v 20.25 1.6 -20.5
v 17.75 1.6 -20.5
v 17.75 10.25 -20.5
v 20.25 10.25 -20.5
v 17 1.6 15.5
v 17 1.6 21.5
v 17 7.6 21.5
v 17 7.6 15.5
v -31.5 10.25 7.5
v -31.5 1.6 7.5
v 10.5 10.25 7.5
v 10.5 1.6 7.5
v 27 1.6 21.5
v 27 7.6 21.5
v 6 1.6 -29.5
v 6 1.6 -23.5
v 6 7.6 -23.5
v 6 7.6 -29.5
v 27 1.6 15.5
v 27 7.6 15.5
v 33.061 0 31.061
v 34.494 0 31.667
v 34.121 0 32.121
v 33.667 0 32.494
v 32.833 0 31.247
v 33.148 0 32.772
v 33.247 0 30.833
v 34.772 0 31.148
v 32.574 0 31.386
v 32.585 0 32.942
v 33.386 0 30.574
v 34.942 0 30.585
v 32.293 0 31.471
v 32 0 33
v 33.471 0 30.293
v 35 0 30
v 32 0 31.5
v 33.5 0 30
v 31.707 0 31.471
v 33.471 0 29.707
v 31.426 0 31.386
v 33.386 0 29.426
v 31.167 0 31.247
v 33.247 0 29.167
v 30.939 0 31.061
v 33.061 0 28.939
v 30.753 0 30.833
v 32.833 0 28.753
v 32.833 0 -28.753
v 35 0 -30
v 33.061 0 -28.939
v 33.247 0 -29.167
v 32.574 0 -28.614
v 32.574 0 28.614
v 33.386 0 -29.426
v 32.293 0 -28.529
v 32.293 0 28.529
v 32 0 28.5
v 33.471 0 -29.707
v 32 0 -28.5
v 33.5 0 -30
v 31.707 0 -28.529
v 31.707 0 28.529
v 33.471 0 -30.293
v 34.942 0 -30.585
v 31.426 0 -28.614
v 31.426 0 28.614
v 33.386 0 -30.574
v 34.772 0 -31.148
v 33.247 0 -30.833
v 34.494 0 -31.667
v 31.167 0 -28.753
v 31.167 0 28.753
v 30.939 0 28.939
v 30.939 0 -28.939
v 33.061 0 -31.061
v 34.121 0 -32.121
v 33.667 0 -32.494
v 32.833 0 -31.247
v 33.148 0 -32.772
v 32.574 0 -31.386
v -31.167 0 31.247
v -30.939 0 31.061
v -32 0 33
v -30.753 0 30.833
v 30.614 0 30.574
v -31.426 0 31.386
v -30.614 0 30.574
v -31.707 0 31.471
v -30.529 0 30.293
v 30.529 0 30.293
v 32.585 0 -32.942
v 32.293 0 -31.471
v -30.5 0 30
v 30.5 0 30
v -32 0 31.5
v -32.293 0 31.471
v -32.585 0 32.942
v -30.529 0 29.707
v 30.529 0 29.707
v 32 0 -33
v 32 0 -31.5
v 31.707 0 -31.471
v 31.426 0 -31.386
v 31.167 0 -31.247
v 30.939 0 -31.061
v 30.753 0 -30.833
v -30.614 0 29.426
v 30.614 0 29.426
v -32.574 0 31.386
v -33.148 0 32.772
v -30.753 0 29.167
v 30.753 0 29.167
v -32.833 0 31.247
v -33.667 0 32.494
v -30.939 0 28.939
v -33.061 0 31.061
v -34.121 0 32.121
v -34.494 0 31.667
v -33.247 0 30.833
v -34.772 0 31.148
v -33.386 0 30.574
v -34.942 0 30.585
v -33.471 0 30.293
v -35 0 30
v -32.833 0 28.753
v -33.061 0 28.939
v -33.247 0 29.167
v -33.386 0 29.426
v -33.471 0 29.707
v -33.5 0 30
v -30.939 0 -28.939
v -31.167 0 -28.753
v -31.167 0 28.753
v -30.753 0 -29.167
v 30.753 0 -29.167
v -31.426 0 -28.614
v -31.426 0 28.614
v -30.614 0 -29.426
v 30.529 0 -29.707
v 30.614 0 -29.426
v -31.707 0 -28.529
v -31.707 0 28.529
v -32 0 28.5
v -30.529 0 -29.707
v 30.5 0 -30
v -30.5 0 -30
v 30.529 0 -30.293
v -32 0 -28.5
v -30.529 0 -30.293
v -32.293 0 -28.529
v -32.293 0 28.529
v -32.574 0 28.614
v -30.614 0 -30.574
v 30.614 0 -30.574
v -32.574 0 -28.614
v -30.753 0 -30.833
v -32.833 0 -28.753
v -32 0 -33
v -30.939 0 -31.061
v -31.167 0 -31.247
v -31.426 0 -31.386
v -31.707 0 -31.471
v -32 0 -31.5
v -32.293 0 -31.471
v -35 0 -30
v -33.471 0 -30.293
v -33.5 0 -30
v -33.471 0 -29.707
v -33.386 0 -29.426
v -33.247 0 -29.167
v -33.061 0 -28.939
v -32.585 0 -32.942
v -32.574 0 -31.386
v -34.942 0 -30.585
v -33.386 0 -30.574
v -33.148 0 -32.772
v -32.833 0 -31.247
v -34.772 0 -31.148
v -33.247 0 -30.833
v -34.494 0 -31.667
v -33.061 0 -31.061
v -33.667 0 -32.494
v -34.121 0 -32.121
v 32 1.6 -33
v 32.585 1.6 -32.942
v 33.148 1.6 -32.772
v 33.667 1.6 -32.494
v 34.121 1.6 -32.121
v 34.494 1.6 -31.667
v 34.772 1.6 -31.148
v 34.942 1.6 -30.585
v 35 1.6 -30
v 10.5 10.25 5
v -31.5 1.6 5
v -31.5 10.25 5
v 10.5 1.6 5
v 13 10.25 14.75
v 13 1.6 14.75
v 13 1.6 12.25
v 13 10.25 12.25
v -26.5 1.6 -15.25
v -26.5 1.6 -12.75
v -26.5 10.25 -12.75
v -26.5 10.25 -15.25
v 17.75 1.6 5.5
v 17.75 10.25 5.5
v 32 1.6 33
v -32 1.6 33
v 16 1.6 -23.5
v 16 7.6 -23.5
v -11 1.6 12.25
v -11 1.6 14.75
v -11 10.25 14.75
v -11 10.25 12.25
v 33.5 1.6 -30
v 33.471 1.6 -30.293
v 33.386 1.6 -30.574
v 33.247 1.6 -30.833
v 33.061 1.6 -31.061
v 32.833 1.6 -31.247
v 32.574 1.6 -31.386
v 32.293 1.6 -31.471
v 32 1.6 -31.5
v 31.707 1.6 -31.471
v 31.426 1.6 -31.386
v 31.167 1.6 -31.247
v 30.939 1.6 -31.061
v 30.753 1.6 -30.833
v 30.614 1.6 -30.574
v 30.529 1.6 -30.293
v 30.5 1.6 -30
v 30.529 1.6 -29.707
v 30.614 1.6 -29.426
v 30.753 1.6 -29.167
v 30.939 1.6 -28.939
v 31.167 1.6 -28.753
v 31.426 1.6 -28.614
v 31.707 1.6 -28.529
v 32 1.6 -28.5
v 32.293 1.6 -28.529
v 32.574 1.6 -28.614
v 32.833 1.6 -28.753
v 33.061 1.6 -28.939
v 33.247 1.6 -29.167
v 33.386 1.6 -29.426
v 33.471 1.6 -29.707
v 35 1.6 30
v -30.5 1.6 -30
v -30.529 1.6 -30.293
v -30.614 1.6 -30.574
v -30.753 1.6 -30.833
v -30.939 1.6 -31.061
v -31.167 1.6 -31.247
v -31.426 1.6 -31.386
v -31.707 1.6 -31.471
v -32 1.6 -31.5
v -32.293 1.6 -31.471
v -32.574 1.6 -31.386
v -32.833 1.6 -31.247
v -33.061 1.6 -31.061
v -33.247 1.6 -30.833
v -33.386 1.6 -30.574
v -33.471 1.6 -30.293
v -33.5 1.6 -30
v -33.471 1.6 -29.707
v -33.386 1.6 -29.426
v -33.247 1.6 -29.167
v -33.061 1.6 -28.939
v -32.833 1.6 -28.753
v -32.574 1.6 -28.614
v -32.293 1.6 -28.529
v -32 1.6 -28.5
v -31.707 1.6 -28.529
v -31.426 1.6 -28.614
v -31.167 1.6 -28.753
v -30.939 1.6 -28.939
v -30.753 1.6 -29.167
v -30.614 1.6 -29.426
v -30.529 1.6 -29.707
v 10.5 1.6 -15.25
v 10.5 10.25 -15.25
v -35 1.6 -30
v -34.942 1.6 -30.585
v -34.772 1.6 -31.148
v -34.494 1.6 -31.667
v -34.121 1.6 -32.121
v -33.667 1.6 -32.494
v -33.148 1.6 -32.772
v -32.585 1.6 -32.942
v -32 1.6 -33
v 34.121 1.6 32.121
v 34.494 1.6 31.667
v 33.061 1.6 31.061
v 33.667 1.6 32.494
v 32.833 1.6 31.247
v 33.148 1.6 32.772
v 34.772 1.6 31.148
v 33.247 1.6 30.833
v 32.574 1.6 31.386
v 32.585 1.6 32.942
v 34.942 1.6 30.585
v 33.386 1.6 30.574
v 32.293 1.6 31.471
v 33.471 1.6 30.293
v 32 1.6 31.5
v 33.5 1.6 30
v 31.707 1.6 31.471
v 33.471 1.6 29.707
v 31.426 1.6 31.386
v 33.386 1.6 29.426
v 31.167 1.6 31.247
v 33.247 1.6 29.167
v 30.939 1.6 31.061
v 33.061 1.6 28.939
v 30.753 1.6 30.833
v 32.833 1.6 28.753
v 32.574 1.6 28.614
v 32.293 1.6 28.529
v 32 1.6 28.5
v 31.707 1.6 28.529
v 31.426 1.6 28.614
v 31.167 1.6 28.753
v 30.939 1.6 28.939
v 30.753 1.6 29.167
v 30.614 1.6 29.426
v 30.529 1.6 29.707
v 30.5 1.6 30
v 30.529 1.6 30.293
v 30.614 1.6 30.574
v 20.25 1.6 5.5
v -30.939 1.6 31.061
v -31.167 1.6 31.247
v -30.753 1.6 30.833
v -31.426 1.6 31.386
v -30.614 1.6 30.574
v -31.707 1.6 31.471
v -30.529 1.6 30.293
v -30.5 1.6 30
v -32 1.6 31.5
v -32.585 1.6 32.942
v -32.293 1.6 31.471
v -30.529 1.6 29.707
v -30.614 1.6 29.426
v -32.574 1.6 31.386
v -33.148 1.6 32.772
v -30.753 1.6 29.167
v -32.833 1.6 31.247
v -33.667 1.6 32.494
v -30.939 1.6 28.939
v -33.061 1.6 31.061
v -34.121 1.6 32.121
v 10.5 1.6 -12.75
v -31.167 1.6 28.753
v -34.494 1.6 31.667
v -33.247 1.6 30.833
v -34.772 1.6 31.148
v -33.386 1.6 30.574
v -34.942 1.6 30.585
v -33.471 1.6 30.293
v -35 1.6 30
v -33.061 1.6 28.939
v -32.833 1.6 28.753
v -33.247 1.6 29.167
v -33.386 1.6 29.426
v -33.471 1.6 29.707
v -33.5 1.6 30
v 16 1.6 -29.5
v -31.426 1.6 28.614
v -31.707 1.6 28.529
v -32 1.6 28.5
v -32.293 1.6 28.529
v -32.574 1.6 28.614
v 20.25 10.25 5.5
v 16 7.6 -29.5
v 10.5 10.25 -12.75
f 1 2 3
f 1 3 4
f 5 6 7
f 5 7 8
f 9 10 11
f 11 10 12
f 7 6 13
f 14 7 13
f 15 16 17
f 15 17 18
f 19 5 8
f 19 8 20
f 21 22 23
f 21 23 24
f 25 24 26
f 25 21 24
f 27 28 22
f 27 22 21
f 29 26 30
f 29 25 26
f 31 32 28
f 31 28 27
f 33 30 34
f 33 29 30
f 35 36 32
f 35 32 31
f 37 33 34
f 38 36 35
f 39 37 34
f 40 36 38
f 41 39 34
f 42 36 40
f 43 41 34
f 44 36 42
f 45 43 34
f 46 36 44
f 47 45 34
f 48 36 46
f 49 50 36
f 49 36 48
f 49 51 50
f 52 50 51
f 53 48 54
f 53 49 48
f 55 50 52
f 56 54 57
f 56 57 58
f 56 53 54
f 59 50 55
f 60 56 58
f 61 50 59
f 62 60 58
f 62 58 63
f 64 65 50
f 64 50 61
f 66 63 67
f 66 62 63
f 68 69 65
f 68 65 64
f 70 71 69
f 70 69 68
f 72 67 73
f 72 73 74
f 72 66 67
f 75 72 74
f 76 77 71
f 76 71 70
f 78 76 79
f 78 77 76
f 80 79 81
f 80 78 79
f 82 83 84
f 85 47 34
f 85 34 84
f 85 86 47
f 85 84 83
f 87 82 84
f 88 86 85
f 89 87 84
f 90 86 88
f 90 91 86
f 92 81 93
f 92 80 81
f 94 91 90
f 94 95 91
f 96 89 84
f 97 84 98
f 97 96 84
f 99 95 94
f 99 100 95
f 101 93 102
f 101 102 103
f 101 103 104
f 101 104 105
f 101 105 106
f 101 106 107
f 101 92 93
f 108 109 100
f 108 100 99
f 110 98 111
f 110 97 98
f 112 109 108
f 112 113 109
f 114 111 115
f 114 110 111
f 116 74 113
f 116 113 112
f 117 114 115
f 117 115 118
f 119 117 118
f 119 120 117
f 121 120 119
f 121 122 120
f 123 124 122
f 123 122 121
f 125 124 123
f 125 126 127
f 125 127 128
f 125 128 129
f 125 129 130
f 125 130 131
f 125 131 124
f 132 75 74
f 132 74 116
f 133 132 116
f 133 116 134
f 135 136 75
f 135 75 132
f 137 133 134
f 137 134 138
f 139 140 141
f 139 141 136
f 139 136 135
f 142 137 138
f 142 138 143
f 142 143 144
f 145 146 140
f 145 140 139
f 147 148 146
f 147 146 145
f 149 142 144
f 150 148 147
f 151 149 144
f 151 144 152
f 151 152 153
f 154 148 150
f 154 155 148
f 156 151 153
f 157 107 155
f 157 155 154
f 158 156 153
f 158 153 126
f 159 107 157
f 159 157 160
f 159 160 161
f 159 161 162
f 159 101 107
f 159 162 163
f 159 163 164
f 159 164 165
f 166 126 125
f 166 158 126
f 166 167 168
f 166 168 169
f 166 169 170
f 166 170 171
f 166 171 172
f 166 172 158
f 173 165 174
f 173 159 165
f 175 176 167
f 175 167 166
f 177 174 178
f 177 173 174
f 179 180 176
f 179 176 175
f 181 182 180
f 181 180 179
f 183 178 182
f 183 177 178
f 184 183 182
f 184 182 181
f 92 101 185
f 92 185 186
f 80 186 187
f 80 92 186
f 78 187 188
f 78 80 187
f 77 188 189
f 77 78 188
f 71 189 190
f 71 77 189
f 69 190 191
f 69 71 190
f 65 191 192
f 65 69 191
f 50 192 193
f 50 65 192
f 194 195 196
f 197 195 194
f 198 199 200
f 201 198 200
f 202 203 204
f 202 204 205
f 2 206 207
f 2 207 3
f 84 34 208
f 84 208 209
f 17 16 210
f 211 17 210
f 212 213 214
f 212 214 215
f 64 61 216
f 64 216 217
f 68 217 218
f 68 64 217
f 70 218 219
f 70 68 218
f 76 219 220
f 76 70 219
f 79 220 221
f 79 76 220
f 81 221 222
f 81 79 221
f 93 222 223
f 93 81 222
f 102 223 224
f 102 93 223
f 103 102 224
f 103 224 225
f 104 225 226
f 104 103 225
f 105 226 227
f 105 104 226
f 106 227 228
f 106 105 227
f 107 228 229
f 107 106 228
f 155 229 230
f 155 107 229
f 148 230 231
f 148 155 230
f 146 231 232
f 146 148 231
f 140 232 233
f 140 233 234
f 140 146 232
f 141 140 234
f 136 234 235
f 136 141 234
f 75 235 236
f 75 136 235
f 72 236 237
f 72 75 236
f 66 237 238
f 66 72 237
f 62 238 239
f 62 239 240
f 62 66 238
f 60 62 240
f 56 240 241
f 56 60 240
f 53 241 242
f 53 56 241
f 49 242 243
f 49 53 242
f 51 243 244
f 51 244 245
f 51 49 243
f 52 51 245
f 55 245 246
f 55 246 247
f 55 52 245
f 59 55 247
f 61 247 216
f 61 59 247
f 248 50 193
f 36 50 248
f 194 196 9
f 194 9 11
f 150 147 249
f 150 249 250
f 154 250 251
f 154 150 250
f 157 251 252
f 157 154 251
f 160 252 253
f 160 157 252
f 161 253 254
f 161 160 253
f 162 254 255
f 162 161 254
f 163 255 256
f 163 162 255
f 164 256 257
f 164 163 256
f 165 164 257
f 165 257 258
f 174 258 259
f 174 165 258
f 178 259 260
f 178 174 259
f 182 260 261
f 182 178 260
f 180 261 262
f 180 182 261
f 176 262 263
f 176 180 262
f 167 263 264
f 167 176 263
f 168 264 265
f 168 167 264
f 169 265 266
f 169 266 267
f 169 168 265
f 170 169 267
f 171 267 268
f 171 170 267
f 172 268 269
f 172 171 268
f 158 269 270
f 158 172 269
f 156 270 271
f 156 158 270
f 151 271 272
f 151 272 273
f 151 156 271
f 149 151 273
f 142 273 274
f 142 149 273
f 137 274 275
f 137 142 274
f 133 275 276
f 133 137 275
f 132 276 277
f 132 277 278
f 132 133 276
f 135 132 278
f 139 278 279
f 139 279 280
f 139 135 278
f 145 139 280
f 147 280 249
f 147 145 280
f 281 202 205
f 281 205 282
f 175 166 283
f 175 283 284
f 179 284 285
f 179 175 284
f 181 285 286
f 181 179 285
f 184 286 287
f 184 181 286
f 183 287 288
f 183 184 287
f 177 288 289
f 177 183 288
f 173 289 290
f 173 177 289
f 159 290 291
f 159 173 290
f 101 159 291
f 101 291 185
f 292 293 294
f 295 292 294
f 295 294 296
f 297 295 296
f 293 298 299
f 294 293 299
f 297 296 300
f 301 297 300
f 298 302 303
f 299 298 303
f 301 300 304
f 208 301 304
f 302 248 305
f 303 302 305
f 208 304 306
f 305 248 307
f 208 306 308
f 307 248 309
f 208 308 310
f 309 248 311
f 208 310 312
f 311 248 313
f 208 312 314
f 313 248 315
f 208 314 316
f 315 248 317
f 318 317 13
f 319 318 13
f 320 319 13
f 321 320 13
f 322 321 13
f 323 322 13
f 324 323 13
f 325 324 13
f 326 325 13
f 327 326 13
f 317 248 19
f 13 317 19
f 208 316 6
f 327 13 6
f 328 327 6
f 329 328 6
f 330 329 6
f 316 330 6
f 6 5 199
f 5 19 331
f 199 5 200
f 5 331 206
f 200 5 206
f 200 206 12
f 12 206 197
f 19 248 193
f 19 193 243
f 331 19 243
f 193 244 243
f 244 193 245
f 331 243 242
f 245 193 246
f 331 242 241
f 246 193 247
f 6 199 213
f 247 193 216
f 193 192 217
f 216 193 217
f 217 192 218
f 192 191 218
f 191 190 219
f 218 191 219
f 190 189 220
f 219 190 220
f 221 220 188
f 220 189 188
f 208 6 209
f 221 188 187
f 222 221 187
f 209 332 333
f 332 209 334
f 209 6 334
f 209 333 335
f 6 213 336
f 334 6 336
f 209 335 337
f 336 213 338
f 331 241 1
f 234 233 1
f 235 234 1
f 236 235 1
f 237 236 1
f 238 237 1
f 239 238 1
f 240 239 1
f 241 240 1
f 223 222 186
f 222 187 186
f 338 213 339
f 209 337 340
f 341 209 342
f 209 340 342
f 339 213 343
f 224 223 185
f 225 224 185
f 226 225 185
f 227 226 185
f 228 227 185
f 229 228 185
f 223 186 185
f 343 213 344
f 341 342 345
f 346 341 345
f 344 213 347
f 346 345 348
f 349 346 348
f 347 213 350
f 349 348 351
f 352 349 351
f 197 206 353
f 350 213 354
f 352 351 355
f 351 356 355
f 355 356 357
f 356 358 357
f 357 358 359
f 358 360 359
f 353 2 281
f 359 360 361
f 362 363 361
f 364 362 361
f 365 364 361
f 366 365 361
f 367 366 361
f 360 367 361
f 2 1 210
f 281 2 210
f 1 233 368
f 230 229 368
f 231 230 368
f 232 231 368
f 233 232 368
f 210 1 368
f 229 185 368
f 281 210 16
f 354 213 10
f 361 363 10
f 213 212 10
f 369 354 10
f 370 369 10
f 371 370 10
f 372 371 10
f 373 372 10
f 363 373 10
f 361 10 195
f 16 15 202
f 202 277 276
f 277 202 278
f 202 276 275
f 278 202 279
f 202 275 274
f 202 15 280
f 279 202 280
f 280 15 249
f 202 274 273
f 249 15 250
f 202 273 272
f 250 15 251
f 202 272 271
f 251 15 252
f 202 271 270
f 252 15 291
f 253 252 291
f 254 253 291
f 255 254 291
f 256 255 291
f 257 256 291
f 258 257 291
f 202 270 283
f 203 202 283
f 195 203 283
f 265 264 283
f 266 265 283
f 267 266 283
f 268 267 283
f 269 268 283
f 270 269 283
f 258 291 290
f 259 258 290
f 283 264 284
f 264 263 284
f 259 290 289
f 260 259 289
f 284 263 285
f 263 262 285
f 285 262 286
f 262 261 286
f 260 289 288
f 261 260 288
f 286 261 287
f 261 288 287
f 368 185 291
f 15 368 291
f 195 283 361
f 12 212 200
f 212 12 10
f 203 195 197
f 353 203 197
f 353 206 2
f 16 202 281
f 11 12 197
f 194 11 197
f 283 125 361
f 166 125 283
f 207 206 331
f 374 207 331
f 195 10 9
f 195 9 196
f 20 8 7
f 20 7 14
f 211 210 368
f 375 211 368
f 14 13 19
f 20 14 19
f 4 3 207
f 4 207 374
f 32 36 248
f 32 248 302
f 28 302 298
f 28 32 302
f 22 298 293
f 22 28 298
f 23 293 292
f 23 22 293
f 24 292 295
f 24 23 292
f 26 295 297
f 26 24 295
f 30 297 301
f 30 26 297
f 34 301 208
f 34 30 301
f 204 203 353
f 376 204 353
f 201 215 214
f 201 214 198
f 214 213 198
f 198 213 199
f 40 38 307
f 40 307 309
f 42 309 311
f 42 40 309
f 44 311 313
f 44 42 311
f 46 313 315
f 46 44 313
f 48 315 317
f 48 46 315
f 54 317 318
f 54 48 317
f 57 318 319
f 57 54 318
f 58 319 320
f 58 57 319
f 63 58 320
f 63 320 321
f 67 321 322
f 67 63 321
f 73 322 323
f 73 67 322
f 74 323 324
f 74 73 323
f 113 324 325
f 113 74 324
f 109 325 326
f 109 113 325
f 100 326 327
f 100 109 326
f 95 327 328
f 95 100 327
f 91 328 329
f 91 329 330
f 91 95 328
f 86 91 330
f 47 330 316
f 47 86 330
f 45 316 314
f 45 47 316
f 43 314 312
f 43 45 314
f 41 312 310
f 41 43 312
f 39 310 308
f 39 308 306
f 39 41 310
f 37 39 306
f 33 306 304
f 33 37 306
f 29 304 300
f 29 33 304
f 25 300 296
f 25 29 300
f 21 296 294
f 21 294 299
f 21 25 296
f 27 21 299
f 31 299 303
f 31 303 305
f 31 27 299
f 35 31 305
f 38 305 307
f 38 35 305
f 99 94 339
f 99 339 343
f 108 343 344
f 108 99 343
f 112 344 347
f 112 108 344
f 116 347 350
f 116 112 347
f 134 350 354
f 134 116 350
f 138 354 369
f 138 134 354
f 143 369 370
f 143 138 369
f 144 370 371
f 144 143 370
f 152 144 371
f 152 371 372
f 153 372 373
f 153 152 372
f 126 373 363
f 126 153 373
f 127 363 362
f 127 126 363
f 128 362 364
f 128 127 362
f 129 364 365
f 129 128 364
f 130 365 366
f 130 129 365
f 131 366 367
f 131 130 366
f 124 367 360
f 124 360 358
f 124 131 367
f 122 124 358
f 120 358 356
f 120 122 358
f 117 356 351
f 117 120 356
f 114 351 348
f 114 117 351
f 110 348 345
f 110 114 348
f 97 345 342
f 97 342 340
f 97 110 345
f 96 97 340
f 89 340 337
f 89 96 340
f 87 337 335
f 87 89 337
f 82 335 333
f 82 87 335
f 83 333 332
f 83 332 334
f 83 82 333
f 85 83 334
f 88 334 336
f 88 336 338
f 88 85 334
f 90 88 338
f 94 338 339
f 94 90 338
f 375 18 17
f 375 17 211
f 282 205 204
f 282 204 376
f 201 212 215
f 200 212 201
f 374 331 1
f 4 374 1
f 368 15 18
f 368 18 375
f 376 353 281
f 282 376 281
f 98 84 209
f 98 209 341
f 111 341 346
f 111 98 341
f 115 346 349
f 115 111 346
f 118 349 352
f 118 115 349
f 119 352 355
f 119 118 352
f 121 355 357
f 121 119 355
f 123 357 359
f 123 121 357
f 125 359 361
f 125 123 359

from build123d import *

# Parameters (mm, degrees)
SKETCH1_R           = 1.5
BOSS_EXTRUDE1_DEPTH = 1.6
SKETCH2_W           = 10
SKETCH2_H           = 6
BOSS_EXTRUDE3_DEPTH = 6
SKETCH2_7_W         = 37
SKETCH2_7_H         = 2.5
SKETCH2_7_W_2       = 42
SKETCH2_7_W_3       = 2.5
SKETCH2_7_H_2       = 26
SKETCH2_7_W_4       = 24
BOSS_EXTRUDE4_DEPTH = 8.65


with BuildPart() as part:
    # Sketch1 → Boss-Extrude1 (new body)
    with BuildSketch(Plane(origin=(0, 0, 0), x_dir=(1, 0, 0), z_dir=(0, 1, 0))):
        with BuildLine():
            Line((-32, 33), (32, 33))
            ThreePointArc((32, 33), (34.121320344, 32.121320344), (35, 30))
            Line((35, 30), (35, -30))
            ThreePointArc((35, -30), (34.121320344, -32.121320344), (32, -33))
            Line((32, -33), (-32, -33))
            ThreePointArc((-32, -33), (-34.121320344, -32.121320344), (-35, -30))
            Line((-35, -30), (-35, 30))
            ThreePointArc((-35, 30), (-34.121320344, 32.121320344), (-32, 33))
        make_face()
        with Locations((-32, 30)):
            Circle(SKETCH1_R, mode=Mode.SUBTRACT)
        with Locations((32, 30)):
            Circle(SKETCH1_R, mode=Mode.SUBTRACT)
        with Locations((32, -30)):
            Circle(SKETCH1_R, mode=Mode.SUBTRACT)
        with Locations((-32, -30)):
            Circle(SKETCH1_R, mode=Mode.SUBTRACT)
    extrude(amount=BOSS_EXTRUDE1_DEPTH)

    # Sketch2 → Boss-Extrude3 (add)
    with BuildSketch(Plane(origin=(0, 1.6, 0), x_dir=(1, 0, 0), z_dir=(0, 1, 0))):
        with Locations((11, 26.5)):
            Rectangle(SKETCH2_W, SKETCH2_H)
        with Locations((22, -18.5)):
            Rectangle(SKETCH2_W, SKETCH2_H)
    extrude(amount=BOSS_EXTRUDE3_DEPTH)

    # Sketch2<7> → Boss-Extrude4 (add)
    with BuildSketch(Plane(origin=(0, 1.6, 0), x_dir=(1, 0, 0), z_dir=(0, 1, 0))):
        with Locations((-8, 14)):
            Rectangle(SKETCH2_7_W, SKETCH2_7_H)
        with Locations((-10.5, -6.25)):
            Rectangle(SKETCH2_7_W_2, SKETCH2_7_H)
        with Locations((19, 7.5)):
            Rectangle(SKETCH2_7_W_3, SKETCH2_7_H_2)
        with Locations((1, -13.5)):
            Rectangle(SKETCH2_7_W_4, SKETCH2_7_H)
    extrude(amount=BOSS_EXTRUDE4_DEPTH)


solid = part.part
